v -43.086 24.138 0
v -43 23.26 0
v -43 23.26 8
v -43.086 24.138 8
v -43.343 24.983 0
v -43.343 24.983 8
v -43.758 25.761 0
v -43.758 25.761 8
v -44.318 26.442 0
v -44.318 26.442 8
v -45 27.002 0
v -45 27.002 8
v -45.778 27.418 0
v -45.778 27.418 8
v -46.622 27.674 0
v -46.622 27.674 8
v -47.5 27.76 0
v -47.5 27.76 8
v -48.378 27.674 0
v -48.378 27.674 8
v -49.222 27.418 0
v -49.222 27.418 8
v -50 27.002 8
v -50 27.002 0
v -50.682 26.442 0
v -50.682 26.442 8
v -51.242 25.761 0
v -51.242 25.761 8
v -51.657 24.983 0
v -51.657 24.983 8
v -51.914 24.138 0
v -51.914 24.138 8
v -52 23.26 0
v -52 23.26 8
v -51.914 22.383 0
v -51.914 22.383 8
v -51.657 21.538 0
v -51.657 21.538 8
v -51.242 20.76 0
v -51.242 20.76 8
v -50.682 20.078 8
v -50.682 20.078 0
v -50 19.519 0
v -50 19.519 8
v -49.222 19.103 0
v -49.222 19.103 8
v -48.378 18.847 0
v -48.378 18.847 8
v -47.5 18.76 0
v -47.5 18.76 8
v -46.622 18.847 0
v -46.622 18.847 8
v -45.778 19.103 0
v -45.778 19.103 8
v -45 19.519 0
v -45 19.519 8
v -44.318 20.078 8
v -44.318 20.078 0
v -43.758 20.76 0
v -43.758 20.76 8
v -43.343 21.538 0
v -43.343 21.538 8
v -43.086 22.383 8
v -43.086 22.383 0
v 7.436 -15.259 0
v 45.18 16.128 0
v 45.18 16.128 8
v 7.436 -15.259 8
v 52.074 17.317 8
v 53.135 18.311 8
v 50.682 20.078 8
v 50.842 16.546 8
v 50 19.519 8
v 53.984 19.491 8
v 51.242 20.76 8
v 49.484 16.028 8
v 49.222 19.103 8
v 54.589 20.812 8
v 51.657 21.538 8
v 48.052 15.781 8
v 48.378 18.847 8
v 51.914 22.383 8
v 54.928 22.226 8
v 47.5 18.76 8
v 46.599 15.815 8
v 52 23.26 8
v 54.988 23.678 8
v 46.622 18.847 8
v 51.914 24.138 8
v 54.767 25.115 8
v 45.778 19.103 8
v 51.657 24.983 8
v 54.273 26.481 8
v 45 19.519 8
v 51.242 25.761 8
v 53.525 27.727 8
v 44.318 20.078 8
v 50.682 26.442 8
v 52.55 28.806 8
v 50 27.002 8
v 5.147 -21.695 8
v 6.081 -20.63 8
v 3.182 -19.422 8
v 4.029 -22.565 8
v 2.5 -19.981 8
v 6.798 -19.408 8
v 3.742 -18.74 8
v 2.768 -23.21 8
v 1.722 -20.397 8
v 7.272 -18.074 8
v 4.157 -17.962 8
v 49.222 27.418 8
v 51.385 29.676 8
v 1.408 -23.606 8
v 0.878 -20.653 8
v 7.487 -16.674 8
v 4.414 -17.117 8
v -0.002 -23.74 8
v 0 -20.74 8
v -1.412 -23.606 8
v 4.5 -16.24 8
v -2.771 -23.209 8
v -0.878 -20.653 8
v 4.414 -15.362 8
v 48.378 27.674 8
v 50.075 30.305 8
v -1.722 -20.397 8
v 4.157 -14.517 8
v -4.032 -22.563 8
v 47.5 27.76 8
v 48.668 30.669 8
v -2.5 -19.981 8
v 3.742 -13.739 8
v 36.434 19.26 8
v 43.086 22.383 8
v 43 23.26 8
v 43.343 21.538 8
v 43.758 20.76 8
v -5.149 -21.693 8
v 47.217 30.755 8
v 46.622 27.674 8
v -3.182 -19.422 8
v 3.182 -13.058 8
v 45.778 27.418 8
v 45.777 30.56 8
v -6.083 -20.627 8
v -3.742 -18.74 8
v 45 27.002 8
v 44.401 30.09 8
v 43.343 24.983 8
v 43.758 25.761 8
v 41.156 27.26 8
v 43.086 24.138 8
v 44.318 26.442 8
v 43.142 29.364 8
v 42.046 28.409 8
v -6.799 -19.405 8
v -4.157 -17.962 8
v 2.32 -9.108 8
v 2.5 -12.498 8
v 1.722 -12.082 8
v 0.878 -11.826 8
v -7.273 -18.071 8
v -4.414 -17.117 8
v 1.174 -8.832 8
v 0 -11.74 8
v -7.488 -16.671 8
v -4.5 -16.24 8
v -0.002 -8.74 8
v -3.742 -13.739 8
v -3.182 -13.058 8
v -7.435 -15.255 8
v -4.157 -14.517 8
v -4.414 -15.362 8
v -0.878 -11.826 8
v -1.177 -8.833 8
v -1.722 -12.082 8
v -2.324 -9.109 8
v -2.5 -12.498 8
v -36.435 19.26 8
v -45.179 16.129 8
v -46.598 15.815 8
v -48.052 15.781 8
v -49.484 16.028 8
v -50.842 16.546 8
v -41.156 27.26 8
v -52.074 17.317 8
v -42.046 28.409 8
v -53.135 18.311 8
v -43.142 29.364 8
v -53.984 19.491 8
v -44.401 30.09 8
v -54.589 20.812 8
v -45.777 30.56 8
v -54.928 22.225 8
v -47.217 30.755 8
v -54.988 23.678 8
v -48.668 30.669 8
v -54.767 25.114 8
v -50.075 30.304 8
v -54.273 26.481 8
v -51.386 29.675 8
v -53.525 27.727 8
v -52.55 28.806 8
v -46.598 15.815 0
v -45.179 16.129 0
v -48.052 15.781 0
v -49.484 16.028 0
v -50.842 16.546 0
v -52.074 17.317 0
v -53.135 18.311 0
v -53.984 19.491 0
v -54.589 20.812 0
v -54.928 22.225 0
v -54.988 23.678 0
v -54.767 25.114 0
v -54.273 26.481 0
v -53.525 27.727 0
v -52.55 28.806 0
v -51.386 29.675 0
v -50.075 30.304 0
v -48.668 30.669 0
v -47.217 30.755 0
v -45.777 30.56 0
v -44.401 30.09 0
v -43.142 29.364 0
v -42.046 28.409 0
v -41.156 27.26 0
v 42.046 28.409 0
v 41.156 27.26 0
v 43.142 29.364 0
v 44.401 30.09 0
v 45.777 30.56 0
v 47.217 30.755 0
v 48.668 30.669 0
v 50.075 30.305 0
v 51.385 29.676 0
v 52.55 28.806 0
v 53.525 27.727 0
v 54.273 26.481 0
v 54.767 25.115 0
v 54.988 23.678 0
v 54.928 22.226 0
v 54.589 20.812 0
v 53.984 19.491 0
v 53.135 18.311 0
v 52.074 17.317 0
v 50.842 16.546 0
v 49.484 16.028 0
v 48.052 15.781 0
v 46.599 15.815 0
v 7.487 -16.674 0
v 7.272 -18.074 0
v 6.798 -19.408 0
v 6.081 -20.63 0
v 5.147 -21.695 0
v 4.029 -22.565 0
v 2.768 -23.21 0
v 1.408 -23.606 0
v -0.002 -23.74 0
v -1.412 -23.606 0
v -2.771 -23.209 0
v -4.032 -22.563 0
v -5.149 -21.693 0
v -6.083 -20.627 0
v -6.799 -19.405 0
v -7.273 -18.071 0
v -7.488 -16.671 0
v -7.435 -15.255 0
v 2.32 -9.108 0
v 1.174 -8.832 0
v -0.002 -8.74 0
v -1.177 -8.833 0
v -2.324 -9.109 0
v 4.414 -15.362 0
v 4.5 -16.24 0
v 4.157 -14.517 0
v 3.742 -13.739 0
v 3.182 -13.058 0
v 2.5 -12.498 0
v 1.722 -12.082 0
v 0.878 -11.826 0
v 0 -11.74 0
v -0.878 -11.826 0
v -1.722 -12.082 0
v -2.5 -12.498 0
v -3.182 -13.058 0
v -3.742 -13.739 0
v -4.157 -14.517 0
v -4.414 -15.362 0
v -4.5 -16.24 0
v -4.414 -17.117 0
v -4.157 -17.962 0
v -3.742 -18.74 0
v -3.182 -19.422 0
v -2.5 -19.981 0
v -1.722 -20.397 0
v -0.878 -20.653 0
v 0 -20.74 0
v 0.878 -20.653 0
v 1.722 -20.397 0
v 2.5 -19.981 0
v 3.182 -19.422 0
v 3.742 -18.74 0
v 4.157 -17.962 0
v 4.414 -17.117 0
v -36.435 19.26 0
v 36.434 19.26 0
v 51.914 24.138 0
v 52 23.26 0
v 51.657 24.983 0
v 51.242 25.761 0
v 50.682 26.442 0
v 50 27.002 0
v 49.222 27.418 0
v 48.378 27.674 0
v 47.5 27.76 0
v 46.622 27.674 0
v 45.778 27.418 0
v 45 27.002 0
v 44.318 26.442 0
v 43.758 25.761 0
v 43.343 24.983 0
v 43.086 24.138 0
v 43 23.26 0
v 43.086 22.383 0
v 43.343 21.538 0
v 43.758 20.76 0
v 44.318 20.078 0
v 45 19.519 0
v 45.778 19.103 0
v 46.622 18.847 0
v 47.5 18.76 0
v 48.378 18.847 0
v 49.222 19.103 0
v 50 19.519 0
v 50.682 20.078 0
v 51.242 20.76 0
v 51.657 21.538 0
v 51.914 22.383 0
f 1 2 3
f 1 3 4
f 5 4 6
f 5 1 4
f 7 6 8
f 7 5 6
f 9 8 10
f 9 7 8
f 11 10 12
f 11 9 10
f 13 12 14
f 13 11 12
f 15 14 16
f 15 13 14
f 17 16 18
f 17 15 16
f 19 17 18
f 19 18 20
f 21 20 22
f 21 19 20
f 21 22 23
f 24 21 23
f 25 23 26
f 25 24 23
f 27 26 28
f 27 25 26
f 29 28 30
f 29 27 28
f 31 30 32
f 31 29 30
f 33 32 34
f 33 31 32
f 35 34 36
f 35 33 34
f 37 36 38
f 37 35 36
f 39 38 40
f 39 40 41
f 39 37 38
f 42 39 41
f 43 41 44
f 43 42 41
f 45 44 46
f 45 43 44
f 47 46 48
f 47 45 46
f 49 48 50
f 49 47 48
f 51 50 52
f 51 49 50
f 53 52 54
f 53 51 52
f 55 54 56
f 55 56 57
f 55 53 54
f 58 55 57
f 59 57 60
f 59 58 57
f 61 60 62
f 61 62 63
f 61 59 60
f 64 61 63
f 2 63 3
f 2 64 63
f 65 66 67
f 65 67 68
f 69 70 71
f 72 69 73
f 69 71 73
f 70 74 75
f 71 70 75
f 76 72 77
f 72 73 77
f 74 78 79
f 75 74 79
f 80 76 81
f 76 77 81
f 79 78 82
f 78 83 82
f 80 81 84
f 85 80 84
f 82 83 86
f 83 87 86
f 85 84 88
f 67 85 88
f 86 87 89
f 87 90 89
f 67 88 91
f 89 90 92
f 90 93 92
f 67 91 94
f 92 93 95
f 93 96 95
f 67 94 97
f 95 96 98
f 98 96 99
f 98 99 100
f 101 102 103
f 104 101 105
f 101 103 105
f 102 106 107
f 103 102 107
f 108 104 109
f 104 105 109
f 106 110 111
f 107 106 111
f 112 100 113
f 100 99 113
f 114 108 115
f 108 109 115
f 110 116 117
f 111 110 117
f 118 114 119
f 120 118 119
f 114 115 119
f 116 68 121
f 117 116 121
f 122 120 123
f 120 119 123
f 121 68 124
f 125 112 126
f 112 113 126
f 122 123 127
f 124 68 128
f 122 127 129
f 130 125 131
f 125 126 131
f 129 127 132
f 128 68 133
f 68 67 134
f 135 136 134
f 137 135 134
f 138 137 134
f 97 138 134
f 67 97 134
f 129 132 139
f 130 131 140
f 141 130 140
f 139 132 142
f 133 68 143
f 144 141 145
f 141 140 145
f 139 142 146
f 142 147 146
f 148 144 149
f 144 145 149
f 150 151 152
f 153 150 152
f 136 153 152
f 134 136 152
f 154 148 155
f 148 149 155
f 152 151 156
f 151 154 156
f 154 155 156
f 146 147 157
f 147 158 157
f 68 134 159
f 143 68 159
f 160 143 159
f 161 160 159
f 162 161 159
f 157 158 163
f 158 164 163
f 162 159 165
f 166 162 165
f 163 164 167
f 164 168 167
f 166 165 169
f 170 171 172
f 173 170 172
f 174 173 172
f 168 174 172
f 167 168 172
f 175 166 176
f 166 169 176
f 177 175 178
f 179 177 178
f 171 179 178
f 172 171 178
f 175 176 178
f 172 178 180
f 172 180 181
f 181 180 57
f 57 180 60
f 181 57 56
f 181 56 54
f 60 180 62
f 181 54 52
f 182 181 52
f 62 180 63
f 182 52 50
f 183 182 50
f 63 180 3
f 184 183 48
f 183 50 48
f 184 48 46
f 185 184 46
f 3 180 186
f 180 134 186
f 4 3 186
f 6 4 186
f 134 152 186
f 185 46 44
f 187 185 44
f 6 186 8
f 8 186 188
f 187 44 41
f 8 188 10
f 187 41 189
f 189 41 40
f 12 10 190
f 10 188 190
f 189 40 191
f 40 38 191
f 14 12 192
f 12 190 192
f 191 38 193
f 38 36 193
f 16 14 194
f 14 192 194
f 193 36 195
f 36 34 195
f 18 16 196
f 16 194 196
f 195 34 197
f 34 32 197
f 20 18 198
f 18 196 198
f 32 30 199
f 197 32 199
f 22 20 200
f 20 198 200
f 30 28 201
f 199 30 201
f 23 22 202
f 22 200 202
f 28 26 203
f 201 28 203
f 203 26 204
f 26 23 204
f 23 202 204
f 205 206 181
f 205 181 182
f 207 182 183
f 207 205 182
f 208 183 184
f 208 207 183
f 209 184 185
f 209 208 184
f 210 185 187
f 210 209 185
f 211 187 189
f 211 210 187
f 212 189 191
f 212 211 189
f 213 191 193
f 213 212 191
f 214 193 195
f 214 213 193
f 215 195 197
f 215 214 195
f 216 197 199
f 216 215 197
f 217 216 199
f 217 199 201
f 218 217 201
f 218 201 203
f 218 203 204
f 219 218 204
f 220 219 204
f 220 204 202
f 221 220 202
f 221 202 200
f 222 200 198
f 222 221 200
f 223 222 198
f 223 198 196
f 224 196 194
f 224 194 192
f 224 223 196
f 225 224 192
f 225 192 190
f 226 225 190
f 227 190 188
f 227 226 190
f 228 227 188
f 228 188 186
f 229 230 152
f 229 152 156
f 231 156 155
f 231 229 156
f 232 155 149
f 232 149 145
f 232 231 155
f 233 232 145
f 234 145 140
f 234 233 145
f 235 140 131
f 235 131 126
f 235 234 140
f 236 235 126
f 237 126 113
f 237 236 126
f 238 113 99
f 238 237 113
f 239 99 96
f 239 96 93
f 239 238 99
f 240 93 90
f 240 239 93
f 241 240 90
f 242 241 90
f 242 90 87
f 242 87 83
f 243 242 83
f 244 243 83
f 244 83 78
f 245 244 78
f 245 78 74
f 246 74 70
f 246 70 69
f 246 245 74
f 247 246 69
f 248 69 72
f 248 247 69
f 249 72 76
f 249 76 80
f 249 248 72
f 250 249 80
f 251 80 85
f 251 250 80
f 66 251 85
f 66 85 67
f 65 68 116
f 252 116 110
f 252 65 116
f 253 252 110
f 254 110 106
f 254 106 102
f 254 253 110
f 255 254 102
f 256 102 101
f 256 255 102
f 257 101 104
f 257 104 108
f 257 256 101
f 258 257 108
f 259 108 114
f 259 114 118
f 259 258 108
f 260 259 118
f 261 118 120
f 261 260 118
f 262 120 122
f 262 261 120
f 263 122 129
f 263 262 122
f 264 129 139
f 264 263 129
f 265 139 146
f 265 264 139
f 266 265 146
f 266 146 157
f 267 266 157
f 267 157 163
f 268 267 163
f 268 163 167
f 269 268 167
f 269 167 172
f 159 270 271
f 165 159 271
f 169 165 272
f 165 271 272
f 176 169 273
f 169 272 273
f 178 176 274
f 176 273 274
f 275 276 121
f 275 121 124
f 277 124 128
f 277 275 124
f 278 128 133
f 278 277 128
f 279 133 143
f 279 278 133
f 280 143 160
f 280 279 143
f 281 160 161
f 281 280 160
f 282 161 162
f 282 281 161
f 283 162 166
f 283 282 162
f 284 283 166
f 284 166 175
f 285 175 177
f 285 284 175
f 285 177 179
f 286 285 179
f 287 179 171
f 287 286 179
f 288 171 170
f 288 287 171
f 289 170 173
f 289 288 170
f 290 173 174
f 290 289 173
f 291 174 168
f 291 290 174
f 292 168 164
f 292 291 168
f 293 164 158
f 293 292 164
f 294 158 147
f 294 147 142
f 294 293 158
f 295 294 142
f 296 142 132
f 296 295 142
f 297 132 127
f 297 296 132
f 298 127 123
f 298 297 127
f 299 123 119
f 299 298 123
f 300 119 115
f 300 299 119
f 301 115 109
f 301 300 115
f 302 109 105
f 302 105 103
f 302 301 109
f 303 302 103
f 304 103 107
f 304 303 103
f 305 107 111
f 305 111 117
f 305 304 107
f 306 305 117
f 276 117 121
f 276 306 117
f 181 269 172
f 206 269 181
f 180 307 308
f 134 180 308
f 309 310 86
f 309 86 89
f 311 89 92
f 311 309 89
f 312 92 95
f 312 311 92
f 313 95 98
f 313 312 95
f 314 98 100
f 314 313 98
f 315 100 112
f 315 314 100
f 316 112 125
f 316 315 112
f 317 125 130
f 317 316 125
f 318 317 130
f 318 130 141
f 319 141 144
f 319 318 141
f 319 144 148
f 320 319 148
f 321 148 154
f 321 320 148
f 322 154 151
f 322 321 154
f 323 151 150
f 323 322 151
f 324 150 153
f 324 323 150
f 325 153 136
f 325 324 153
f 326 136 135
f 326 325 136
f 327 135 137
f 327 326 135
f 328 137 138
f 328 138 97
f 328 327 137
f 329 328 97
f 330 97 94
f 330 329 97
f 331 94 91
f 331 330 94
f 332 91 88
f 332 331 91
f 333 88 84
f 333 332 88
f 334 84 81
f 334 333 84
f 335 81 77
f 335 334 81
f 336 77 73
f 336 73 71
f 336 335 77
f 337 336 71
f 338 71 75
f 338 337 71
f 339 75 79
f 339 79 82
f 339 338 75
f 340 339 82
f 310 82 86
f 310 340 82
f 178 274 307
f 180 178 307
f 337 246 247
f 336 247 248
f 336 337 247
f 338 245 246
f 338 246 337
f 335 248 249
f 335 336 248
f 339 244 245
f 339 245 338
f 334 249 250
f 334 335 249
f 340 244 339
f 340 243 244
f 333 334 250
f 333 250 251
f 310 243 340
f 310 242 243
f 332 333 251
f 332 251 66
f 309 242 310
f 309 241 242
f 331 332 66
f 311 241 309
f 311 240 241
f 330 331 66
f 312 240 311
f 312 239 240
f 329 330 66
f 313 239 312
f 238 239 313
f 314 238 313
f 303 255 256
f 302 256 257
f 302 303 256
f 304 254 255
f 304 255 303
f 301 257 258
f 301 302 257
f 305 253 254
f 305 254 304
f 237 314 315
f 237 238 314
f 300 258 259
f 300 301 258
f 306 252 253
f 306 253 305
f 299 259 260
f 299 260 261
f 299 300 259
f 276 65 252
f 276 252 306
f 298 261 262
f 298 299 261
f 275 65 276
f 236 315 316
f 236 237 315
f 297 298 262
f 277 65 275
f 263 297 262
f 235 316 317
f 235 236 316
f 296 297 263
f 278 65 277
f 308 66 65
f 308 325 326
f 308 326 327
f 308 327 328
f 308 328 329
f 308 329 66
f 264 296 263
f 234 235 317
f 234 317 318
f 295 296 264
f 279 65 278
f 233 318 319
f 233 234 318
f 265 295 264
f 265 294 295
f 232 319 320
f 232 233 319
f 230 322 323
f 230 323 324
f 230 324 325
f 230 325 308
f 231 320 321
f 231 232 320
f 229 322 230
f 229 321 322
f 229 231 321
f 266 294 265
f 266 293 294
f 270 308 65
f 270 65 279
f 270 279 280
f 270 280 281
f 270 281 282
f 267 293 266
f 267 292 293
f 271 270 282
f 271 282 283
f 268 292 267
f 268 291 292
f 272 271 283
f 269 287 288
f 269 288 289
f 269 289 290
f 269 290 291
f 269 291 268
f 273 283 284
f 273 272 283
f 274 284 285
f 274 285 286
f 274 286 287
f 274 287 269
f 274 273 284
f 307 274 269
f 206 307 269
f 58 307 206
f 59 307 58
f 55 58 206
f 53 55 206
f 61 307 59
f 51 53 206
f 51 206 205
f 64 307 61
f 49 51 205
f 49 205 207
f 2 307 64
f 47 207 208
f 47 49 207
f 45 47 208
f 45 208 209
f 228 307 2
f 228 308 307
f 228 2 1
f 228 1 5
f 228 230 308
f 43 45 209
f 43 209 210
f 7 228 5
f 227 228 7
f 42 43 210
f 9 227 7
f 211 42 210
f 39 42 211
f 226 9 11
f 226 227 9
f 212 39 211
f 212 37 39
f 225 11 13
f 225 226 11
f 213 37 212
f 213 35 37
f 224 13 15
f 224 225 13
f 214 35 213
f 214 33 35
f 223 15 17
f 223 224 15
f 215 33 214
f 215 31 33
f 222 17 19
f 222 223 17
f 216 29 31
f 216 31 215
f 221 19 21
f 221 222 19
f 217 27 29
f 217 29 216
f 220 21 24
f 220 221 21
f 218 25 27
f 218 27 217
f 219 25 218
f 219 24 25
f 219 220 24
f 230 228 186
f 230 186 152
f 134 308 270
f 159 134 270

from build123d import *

# Parameters (mm, degrees)
SKETCH1_R           = 4.5
BOSS_EXTRUDE1_DEPTH = 8


with BuildPart() as part:
    # Sketch1 → Boss-Extrude1 (new body)
    with BuildSketch(Plane.XY):
        with BuildLine():
            Line((45.179528047, 16.128442524), (7.43557573, -15.258633613))
            ThreePointArc((7.43557573, -15.258633613), (-0.001652224, -23.739558281), (-7.43514282, -15.255357644))
            Line((-7.43514282, -15.255357644), (-45.17916835, 16.128559565))
            ThreePointArc((-45.17916835, 16.128559565), (-54.553423072, 25.809798901), (-41.15571123, 27.260441537))
            Line((-41.15571123, 27.260441537), (41.15571123, 27.260441537))
            ThreePointArc((41.15571123, 27.260441537), (54.553358782, 25.809976769), (45.179528047, 16.128442524))
        make_face()
        with Locations((-47.5, 23.260441537)):
            Circle(SKETCH1_R, mode=Mode.SUBTRACT)
        with Locations((47.5, 23.260441537)):
            Circle(SKETCH1_R, mode=Mode.SUBTRACT)
        with Locations((0, -16.239558463)):
            Circle(SKETCH1_R, mode=Mode.SUBTRACT)
        with BuildLine():
            Line((36.433890862, 19.260441537), (2.320471953, -9.107559451))
            ThreePointArc((2.320471953, -9.107559451), (-0.001660699, -8.739558647), (-2.323630152, -9.108587778))
            Line((-2.323630152, -9.108587778), (-36.434768163, 19.260441537))
            Line((-36.434768163, 19.260441537), (36.433890862, 19.260441537))
        make_face(mode=Mode.SUBTRACT)
    extrude(amount=BOSS_EXTRUDE1_DEPTH)


solid = part.part
